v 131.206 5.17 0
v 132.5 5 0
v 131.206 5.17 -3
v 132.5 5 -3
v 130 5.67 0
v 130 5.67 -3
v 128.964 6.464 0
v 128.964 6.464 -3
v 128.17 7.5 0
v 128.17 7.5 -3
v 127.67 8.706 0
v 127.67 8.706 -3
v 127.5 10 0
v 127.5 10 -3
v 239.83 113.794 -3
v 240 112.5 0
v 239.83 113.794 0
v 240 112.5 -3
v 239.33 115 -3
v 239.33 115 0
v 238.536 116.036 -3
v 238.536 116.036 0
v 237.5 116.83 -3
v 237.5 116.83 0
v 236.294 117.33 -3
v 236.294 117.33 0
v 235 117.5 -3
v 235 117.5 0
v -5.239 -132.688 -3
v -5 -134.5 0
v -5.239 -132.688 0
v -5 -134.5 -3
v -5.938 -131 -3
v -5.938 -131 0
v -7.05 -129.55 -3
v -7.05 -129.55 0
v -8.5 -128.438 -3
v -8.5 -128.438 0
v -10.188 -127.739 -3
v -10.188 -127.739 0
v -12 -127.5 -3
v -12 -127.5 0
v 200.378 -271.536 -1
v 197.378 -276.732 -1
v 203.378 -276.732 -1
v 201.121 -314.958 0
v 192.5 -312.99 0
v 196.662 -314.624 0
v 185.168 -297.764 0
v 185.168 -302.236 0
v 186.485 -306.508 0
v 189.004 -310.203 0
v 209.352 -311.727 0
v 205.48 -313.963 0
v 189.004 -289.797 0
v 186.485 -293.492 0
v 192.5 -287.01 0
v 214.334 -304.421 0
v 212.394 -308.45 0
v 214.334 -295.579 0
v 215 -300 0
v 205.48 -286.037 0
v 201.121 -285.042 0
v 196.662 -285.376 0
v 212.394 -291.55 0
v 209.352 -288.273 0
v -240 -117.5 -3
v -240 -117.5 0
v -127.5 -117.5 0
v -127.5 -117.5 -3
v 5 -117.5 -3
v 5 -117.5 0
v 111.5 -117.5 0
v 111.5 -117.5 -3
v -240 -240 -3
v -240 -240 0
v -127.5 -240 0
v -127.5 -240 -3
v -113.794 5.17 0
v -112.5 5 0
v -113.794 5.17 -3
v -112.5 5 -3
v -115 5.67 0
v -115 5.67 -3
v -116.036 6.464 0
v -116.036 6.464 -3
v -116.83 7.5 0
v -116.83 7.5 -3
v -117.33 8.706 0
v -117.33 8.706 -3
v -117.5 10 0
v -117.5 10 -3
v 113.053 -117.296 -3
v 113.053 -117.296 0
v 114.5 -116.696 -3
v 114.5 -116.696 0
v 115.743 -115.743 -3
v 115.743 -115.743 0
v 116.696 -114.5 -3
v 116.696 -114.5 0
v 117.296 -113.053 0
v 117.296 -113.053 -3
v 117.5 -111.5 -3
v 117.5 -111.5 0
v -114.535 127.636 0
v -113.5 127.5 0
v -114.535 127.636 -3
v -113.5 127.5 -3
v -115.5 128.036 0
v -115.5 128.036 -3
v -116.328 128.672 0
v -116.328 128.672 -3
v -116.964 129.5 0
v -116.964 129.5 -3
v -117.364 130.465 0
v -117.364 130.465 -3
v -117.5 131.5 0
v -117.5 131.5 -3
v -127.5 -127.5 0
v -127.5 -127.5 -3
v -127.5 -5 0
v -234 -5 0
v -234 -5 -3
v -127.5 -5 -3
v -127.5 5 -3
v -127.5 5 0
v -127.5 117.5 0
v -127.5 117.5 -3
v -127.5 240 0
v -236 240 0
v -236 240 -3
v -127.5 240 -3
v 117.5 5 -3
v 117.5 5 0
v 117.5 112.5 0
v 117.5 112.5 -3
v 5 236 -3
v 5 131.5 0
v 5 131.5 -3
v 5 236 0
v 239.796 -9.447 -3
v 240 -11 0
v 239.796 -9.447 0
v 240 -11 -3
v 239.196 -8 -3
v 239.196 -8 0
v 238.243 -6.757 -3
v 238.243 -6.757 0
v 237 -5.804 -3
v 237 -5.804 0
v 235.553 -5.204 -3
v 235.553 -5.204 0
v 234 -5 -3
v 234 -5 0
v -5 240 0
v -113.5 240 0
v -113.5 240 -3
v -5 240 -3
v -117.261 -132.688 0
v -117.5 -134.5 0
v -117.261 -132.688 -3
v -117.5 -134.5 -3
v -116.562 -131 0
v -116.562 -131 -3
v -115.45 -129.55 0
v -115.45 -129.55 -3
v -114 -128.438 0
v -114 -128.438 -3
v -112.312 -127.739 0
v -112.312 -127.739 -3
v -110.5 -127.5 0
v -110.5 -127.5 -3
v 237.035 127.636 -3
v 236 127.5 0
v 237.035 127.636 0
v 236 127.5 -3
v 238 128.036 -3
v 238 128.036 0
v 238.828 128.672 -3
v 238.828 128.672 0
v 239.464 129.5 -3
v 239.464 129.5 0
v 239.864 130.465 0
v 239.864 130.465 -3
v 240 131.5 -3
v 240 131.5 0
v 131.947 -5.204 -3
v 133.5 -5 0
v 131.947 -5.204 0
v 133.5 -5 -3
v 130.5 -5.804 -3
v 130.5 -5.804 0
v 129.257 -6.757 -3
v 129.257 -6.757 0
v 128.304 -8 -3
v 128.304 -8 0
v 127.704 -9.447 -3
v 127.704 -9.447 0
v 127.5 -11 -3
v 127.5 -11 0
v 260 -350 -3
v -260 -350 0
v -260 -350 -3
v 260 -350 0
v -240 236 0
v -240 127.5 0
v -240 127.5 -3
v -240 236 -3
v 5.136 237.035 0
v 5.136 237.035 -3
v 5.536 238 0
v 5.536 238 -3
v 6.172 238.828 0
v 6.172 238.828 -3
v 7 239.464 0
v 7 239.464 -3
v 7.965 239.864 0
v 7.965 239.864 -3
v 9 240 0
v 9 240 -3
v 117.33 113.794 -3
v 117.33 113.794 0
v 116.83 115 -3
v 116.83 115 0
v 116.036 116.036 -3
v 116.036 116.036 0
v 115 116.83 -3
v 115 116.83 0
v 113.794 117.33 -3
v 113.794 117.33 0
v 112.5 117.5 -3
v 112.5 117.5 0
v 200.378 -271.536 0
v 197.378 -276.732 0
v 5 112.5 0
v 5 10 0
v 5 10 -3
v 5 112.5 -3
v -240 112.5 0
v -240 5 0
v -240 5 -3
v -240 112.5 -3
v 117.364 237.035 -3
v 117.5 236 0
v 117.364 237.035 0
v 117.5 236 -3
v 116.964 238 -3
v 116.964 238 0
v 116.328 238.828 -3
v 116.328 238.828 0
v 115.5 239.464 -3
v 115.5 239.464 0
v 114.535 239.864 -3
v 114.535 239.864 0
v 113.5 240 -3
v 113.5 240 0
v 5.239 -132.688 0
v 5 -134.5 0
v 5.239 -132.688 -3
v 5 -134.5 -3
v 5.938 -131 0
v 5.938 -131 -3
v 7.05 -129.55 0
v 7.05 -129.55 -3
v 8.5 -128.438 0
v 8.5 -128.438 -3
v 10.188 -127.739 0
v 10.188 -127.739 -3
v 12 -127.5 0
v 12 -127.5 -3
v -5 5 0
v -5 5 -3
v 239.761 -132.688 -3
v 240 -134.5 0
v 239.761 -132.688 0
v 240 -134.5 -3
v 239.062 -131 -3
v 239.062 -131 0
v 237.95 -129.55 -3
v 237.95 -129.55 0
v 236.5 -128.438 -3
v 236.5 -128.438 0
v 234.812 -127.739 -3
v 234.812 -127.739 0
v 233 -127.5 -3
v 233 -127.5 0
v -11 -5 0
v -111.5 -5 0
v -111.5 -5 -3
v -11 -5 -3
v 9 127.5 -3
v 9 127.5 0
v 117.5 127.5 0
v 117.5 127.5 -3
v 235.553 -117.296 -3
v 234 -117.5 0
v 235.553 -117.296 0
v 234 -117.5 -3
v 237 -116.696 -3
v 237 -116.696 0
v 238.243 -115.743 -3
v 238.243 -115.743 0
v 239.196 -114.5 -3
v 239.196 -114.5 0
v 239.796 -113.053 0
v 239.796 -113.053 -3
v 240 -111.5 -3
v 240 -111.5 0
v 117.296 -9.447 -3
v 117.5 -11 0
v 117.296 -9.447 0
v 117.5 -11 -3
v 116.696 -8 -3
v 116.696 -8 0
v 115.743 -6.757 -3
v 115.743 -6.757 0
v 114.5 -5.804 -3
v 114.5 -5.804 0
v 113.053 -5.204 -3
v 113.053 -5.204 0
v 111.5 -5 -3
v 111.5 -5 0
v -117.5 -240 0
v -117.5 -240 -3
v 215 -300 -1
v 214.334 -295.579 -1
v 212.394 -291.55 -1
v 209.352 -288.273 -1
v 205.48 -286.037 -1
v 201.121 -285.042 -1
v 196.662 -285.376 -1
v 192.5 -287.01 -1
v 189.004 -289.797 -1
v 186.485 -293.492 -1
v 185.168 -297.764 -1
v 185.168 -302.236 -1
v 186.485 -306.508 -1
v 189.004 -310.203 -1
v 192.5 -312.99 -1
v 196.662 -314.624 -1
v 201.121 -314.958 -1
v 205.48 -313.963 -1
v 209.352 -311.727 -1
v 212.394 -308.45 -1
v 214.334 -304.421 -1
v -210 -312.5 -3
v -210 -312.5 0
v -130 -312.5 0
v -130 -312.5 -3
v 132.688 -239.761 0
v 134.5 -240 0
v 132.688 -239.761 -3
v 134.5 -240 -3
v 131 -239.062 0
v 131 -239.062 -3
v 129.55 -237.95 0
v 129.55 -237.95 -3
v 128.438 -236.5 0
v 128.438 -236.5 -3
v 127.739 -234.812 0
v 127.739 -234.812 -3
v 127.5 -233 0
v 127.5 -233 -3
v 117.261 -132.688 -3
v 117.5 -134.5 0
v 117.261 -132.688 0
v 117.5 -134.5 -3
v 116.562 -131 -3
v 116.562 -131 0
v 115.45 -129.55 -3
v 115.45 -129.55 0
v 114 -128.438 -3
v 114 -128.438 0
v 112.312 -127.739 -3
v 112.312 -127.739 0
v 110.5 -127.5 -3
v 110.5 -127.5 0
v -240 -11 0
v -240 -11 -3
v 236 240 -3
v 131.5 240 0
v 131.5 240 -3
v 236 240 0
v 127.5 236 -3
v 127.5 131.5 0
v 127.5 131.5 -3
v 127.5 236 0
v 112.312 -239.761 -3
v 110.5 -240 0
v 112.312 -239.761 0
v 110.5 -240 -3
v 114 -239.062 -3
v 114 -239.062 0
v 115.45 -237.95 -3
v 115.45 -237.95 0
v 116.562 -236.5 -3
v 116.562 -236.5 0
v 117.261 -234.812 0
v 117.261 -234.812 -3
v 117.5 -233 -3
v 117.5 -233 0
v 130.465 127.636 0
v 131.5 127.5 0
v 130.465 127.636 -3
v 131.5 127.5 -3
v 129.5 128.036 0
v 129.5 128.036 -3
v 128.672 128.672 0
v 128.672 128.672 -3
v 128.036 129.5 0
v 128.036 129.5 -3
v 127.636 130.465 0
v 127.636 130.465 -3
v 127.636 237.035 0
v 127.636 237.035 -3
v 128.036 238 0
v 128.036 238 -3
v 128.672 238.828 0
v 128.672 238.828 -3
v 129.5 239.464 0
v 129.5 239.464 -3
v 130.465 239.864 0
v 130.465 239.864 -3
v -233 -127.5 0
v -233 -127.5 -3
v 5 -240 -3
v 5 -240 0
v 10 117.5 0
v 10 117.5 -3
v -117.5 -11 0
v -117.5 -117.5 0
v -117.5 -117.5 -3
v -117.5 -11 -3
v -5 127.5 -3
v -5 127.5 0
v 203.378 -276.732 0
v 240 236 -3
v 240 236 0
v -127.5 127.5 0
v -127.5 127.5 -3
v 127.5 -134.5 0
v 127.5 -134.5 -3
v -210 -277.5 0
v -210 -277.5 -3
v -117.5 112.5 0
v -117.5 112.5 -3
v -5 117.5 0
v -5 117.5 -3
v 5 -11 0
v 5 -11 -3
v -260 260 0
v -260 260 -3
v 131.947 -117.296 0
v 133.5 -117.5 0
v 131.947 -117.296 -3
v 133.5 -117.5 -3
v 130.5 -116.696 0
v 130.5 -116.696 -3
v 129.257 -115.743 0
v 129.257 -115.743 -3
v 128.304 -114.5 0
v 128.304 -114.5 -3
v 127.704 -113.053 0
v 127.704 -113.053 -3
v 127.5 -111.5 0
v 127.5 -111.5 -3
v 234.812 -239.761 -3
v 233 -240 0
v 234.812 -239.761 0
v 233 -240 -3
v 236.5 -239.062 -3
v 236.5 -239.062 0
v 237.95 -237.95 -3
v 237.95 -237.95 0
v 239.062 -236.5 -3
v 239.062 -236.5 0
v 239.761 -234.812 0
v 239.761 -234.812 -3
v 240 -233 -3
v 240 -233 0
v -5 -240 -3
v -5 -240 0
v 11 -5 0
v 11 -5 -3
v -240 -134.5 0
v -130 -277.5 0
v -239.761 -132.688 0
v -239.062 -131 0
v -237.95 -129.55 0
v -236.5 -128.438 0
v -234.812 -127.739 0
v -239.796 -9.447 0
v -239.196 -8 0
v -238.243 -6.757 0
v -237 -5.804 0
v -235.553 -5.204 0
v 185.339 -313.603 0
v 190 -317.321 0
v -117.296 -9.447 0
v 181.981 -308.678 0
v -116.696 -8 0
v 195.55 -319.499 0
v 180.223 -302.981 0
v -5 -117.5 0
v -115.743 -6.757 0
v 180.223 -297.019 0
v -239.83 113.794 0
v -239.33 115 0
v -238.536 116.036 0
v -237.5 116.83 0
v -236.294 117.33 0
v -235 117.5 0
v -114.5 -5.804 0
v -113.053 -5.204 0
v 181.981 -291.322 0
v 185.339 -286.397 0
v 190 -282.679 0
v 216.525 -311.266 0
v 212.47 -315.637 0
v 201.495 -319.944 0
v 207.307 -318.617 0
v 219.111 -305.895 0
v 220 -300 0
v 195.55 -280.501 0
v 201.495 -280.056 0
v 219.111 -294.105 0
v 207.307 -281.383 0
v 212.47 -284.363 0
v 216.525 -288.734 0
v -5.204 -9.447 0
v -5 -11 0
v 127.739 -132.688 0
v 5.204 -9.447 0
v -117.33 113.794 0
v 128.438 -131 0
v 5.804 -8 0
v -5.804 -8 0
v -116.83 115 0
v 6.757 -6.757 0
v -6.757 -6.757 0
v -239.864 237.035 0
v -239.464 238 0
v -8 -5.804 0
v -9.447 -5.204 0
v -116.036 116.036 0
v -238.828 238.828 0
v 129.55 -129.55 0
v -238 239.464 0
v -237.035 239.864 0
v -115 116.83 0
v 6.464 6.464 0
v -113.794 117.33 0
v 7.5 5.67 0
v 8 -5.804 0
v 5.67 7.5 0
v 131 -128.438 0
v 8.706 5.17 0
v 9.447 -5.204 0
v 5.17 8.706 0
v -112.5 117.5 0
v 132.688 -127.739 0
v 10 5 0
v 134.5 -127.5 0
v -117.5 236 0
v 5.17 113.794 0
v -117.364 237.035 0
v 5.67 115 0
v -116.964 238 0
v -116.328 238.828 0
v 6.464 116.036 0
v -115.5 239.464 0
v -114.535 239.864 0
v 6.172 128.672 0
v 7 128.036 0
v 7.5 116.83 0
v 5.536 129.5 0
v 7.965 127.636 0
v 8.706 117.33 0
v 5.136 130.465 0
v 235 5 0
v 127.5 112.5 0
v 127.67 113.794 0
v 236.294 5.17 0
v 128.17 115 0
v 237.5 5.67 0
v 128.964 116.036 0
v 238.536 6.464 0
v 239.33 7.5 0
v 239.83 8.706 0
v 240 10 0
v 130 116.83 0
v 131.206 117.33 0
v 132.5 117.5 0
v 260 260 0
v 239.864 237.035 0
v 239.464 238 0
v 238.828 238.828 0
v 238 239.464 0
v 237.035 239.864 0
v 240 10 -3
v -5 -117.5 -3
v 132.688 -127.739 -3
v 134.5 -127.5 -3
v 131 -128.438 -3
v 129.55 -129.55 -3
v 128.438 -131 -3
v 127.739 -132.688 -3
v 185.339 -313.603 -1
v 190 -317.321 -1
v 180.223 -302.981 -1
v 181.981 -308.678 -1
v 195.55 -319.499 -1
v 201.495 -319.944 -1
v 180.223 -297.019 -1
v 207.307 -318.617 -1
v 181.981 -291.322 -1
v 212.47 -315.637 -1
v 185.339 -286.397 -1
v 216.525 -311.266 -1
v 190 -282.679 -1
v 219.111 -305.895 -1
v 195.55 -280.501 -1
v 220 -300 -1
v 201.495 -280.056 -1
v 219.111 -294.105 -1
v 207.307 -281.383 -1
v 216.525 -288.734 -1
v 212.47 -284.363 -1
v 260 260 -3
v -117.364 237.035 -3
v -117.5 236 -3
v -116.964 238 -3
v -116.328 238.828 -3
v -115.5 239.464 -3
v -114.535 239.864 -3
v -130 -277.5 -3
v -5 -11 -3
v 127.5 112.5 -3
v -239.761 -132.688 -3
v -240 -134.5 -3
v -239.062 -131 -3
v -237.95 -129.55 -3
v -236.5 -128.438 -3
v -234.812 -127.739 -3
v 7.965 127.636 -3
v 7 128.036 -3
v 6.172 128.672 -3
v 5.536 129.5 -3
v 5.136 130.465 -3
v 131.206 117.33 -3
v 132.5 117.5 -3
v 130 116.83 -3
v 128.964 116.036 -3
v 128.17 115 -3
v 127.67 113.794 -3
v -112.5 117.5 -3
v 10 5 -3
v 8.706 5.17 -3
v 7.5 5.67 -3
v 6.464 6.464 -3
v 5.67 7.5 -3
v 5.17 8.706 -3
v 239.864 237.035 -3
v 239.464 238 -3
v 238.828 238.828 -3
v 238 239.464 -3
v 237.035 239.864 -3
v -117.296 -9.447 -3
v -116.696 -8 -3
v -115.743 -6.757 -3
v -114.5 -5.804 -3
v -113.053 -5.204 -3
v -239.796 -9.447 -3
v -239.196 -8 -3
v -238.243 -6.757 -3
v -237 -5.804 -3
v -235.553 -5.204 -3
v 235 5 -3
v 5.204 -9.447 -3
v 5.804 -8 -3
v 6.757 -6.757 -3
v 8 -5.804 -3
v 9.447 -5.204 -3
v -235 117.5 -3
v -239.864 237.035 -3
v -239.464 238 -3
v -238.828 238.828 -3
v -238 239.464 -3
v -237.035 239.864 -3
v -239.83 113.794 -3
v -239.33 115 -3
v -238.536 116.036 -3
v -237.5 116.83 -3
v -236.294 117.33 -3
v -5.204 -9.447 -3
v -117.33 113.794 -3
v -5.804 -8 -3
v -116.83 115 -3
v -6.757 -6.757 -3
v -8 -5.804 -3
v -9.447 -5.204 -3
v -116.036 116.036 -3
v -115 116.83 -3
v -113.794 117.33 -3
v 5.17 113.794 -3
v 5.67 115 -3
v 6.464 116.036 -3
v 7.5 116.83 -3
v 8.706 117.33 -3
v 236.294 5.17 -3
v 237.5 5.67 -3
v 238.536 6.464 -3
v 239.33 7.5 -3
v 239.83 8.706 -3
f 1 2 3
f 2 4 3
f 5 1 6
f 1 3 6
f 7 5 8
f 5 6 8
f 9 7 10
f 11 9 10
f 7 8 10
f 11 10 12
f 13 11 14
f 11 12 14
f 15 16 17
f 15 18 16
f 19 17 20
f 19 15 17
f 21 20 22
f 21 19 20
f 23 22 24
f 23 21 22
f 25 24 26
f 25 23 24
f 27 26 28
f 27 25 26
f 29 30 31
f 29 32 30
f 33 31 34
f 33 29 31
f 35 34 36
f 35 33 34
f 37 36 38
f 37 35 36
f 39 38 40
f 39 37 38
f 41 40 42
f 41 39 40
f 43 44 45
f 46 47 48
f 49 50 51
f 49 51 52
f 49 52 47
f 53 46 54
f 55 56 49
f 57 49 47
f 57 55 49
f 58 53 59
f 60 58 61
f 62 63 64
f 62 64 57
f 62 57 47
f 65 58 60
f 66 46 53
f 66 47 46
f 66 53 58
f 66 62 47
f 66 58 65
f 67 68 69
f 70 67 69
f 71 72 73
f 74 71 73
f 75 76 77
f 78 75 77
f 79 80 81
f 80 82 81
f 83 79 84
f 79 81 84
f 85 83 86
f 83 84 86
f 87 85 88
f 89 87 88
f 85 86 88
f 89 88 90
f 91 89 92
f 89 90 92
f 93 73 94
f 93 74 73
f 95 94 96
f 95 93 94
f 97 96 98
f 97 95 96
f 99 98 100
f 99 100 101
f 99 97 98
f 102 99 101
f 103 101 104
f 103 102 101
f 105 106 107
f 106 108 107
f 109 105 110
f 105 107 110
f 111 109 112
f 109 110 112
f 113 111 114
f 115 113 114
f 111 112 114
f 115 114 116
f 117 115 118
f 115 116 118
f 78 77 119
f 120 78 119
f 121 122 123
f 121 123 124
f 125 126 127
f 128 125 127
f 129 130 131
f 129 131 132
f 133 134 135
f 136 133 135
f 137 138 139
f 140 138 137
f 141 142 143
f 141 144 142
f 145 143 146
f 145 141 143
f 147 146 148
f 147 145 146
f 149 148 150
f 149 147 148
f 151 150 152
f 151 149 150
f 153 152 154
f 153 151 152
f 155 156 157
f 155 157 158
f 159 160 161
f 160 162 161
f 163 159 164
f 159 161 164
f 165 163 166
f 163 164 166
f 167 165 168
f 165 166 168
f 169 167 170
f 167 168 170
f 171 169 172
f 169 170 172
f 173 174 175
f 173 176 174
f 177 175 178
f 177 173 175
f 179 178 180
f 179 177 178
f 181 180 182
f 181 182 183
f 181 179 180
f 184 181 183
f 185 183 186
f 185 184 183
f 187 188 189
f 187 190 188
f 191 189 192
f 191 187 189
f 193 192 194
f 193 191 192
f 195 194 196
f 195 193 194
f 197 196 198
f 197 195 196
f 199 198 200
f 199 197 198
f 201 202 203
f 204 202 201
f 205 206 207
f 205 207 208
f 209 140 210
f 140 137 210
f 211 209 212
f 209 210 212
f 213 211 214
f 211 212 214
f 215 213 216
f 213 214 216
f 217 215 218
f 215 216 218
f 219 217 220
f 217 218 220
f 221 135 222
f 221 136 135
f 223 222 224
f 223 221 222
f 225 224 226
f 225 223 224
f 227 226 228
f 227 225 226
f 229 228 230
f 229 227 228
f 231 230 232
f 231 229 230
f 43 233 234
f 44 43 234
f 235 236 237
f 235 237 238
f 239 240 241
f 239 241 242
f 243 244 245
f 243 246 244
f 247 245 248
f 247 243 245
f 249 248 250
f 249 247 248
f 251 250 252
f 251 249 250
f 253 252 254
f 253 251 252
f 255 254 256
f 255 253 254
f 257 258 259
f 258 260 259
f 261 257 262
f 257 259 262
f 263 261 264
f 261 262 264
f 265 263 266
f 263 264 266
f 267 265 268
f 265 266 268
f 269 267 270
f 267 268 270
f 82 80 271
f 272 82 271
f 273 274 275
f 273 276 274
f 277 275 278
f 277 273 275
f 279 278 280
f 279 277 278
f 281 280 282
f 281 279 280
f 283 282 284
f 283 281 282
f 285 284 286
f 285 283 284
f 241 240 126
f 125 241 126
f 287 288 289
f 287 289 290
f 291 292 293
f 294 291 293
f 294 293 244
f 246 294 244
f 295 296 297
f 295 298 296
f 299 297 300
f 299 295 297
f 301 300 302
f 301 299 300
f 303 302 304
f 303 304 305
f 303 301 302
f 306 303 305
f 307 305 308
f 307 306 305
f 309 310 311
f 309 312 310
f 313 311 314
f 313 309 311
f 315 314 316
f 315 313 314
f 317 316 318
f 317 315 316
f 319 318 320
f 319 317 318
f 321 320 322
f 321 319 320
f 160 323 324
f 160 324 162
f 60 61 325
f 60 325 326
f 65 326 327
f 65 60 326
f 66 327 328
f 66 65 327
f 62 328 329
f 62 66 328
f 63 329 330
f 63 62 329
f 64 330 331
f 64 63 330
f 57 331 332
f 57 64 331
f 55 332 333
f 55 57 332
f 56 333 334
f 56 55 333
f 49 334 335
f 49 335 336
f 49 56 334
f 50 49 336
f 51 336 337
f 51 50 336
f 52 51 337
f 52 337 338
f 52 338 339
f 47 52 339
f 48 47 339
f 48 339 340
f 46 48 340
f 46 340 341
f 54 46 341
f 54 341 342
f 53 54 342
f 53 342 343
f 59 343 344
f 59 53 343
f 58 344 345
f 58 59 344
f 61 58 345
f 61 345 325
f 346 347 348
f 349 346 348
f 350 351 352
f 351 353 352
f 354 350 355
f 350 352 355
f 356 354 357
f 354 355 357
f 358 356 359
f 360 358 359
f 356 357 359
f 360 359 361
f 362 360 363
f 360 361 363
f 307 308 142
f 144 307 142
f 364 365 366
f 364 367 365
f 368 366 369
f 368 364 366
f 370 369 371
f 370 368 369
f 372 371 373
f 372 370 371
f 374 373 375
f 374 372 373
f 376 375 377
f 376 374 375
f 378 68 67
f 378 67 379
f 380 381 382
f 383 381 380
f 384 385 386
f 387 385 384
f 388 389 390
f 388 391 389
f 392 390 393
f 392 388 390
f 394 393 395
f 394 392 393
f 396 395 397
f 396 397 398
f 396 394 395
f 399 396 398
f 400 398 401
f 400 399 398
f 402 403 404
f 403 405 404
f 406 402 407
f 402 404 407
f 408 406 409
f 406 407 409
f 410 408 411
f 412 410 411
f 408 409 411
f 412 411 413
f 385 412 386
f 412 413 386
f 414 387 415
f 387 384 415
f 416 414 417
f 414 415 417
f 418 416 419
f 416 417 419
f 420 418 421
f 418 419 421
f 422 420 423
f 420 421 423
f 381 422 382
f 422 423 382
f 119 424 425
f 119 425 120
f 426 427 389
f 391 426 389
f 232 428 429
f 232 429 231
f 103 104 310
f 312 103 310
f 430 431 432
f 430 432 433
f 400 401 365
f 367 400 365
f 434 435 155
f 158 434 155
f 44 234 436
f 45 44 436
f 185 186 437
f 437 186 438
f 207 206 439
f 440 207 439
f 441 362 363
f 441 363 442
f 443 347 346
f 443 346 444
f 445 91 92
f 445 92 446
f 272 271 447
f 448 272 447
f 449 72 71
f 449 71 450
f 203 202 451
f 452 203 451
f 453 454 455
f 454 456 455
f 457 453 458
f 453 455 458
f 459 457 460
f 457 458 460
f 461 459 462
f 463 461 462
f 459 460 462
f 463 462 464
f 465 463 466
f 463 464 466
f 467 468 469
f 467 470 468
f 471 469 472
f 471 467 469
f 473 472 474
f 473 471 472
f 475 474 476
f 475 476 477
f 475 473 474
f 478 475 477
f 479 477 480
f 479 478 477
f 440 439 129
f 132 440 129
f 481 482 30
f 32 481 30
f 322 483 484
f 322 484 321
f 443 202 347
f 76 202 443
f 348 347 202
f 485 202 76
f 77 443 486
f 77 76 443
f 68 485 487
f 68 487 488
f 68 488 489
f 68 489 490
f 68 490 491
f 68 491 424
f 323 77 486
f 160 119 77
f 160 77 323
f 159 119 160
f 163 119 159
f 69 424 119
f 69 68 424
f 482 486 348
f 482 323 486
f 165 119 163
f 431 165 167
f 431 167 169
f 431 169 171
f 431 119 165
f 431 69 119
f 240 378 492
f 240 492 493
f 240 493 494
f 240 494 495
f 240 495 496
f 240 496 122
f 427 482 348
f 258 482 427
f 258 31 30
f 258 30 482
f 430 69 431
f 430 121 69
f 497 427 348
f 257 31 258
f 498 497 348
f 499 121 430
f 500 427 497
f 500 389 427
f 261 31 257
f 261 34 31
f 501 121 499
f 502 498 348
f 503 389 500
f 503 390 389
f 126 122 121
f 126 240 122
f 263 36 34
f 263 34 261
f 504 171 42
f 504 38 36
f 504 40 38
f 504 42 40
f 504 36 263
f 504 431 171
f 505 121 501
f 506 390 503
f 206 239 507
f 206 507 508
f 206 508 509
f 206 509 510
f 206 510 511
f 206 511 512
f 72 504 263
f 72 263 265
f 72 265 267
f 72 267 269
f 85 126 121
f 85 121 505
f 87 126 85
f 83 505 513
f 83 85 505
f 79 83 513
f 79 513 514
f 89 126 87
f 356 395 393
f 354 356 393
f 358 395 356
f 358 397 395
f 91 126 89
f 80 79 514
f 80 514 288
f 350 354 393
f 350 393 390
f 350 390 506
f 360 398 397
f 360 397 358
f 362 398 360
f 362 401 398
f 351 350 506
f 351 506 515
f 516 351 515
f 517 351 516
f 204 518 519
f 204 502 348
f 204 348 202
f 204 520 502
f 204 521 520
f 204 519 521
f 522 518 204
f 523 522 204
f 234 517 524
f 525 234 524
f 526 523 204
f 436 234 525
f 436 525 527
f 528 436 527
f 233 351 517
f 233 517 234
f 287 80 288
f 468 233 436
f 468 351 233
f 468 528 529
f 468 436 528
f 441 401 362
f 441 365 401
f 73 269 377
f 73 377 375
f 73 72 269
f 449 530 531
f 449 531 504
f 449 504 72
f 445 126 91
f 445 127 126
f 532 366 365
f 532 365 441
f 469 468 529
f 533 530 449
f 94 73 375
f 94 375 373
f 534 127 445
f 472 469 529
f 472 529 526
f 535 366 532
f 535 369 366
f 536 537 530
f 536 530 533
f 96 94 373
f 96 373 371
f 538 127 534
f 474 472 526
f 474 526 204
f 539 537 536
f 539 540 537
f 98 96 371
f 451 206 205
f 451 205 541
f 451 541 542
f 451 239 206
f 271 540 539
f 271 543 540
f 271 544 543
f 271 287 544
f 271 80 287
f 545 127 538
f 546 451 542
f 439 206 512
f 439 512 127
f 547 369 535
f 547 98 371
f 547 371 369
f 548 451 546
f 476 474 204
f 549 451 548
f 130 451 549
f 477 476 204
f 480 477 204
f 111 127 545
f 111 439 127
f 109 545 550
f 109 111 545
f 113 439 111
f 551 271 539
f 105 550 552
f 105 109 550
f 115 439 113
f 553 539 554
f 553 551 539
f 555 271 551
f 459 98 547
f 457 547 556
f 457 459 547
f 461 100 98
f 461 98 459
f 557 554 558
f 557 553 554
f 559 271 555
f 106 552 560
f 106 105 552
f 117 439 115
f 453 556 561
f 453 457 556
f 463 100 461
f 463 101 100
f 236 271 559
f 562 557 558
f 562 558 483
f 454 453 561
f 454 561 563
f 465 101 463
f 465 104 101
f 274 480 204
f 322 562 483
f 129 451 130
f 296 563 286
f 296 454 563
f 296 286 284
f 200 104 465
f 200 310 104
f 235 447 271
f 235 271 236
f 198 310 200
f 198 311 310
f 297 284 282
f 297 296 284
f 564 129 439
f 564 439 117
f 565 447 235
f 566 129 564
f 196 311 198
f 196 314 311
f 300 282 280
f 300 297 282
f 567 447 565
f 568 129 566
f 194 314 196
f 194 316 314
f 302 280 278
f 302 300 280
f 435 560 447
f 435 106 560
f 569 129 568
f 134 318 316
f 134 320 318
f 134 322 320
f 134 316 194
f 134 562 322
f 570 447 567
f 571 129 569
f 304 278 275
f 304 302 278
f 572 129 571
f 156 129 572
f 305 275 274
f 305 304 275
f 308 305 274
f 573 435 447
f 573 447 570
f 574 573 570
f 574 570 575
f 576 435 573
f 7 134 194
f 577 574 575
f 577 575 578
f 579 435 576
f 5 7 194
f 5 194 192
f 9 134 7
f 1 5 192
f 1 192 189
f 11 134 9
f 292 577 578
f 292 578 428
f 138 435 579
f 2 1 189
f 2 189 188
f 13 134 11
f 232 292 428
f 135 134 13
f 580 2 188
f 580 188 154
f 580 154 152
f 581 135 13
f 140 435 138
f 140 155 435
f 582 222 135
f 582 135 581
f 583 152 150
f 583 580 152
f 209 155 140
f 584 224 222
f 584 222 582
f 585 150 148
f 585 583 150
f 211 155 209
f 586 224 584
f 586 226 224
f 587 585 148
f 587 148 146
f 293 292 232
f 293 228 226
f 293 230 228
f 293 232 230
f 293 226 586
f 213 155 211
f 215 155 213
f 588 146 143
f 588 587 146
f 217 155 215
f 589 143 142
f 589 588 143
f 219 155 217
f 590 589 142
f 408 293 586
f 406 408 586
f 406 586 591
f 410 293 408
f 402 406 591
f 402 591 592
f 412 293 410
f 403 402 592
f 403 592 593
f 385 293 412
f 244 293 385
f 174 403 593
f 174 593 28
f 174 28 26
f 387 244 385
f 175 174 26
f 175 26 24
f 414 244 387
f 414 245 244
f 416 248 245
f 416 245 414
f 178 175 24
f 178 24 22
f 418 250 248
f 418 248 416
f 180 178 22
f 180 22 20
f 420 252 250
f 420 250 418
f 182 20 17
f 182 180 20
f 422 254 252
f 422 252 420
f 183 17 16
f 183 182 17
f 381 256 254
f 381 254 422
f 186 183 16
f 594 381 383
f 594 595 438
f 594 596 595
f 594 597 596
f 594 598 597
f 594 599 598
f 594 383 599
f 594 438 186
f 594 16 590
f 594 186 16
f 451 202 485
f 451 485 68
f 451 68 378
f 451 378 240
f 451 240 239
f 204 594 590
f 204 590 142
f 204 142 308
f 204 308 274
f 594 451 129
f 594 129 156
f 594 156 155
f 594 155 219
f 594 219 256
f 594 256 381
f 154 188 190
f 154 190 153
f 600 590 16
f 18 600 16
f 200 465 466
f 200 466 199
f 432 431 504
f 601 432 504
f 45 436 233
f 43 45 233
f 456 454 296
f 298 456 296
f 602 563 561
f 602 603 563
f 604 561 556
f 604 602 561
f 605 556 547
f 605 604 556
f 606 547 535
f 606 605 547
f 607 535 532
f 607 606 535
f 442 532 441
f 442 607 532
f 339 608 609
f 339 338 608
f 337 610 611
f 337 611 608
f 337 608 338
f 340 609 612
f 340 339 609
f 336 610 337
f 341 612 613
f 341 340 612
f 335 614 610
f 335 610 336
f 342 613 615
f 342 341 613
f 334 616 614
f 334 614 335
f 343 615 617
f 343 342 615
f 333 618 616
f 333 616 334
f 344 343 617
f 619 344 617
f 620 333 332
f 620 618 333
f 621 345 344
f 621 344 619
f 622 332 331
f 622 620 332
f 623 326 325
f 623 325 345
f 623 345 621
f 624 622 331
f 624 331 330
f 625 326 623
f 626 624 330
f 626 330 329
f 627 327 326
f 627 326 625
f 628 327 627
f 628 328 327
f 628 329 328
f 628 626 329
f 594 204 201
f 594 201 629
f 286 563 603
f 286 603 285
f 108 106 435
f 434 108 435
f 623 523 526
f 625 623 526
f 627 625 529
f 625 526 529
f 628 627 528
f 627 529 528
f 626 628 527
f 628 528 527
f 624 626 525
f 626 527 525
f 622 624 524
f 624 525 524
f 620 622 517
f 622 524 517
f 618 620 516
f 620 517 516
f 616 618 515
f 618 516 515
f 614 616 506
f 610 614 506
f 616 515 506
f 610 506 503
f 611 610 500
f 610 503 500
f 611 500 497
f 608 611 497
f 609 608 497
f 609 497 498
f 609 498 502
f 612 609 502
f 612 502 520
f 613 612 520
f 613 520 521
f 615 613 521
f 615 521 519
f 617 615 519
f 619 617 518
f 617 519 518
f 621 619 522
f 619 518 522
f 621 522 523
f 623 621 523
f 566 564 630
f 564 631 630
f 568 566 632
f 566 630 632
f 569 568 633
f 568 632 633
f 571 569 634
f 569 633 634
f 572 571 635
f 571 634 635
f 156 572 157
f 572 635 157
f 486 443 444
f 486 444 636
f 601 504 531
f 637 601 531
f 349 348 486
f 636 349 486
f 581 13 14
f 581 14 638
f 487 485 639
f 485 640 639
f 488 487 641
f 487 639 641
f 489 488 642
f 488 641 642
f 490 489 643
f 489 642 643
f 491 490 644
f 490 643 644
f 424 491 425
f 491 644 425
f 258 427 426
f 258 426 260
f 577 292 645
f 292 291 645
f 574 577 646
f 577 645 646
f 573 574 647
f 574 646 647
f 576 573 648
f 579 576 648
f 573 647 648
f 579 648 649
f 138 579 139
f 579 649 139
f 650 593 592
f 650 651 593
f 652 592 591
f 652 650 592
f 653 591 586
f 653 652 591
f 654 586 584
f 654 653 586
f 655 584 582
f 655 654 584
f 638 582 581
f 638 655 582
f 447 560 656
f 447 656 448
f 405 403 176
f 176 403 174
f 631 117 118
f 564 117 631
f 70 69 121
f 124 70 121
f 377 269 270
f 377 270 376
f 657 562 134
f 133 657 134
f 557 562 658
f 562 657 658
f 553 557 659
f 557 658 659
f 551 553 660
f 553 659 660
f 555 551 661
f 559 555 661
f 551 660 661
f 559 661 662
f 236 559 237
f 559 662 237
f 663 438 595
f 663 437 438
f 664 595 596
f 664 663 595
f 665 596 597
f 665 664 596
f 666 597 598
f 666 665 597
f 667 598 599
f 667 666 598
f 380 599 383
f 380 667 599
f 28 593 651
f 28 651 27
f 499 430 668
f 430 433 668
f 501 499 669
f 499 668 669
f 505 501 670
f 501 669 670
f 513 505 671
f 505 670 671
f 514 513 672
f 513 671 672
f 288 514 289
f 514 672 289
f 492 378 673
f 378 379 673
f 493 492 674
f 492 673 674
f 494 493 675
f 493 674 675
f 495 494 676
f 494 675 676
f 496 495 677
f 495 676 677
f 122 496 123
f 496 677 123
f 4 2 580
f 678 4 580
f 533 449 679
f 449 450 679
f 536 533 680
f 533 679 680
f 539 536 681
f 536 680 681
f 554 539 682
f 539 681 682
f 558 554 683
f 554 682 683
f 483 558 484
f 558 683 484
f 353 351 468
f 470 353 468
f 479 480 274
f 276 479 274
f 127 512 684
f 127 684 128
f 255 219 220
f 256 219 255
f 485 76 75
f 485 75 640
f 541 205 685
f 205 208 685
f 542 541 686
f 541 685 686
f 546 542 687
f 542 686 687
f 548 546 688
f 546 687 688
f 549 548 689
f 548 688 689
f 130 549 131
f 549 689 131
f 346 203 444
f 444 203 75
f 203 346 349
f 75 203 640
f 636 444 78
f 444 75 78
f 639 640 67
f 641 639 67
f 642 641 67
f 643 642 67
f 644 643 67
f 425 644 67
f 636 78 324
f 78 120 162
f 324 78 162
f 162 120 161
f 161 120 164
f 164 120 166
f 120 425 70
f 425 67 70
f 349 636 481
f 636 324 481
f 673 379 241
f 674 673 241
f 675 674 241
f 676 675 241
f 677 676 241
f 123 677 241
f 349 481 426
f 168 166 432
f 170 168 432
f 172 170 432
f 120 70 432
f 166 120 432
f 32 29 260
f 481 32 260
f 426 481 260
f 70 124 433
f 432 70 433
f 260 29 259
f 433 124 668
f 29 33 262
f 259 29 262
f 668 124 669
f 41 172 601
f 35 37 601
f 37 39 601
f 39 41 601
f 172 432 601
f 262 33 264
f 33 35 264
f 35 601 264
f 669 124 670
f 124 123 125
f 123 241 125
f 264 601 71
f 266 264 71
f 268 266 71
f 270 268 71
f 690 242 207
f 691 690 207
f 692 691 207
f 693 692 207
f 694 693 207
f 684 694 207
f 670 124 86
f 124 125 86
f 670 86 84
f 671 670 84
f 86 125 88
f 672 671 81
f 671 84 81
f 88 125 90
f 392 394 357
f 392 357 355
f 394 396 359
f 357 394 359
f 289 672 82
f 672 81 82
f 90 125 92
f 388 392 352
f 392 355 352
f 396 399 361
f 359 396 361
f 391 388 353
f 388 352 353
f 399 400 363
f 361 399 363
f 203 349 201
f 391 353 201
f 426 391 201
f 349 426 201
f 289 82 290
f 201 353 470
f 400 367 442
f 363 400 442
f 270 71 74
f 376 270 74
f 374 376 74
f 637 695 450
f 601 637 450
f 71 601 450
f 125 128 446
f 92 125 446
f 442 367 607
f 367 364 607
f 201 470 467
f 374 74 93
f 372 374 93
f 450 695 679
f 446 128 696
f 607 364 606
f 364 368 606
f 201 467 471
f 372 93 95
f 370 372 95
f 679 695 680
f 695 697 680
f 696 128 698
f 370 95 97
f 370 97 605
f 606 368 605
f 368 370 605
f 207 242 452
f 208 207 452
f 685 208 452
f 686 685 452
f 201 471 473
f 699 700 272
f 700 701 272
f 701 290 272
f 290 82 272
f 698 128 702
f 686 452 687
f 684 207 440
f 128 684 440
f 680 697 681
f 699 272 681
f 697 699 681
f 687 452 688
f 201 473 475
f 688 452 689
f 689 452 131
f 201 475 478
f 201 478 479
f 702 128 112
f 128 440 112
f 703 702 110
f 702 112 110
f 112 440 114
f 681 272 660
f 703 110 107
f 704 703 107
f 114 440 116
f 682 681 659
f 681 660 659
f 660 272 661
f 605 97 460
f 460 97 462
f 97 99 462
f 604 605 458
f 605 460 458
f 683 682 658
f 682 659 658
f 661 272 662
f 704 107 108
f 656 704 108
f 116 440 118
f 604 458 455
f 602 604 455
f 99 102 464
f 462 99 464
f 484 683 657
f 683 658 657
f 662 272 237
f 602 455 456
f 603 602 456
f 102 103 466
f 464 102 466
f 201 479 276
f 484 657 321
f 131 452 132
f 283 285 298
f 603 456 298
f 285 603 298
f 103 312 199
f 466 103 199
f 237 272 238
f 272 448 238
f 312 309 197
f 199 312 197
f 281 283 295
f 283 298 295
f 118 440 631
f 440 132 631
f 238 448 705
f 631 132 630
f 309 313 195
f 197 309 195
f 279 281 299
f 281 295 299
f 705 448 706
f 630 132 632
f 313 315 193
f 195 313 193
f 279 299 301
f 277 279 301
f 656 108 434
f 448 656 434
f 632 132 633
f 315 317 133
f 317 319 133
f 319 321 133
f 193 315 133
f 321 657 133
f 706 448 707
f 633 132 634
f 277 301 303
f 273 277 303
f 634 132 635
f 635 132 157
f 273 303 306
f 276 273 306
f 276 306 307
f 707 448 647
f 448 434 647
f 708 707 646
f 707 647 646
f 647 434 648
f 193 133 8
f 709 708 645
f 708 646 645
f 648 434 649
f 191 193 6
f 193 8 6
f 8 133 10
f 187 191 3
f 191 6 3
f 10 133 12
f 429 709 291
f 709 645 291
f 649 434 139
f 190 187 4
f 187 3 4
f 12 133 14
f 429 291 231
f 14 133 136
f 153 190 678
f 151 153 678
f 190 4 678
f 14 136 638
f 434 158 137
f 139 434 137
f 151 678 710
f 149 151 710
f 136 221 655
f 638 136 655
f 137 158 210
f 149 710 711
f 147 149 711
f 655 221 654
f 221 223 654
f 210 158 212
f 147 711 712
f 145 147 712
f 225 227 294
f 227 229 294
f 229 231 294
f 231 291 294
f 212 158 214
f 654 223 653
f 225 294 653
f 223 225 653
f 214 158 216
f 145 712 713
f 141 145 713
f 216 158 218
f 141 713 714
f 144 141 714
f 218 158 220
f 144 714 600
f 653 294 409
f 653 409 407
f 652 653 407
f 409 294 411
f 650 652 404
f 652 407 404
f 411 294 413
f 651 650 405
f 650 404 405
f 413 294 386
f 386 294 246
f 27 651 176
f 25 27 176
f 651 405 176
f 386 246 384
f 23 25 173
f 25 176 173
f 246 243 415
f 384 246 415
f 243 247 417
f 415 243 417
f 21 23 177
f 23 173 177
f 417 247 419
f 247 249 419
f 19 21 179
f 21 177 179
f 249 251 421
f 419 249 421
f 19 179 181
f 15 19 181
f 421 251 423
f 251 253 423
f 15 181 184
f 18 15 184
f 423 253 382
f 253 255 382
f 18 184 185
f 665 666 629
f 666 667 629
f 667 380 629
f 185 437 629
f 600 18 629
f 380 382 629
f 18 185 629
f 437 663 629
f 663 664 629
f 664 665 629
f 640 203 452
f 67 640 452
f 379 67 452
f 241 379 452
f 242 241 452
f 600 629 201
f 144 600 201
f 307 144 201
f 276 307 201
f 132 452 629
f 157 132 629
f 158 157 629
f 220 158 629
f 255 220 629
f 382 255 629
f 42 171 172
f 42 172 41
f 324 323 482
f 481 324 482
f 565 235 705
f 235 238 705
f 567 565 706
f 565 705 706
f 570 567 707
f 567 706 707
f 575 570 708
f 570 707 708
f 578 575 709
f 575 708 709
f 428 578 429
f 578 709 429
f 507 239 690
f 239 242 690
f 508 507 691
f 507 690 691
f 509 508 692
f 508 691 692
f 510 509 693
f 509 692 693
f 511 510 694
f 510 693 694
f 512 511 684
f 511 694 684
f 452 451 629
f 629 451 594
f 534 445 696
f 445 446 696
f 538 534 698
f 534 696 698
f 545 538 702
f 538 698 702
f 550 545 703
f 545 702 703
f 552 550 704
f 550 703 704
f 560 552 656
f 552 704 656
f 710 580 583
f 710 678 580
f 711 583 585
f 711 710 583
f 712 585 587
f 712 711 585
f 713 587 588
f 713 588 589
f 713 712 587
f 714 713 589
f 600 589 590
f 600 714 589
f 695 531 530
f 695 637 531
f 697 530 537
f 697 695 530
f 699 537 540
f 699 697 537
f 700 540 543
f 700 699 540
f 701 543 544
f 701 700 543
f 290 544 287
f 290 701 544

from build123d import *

# Parameters (mm, degrees)
SKETCH_W                     = 520
SKETCH_H                     = 610
PAD_DEPTH                    = 3
SKETCH001_W                  = 112.5
SKETCH001_H                  = 112.5
POCKET_DEPTH                 = 5
SKETCH001_LINEARPATTERN_2_W  = 112.5
SKETCH001_LINEARPATTERN_2_H  = 112.5
POCKET_LINEARPATTERN_2_DEPTH = 5
SKETCH001_LINEARPATTERN_3_W  = 112.5
SKETCH001_LINEARPATTERN_3_H  = 112.5
POCKET_LINEARPATTERN_3_DEPTH = 5
SKETCH001_LINEARPATTERN_4_W  = 112.5
SKETCH001_LINEARPATTERN_4_H  = 112.5
POCKET_LINEARPATTERN_4_DEPTH = 5
LINEARPATTERN001_COUNT       = 4
LINEARPATTERN001_PITCH       = 122.5
FILLET_R                     = 4
FILLET001_R                  = 5
FILLET002_R                  = 6
FILLET003_R                  = 7
SKETCH002_R                  = 20
SKETCH002_R_2                = 15
POCKET001_DEPTH              = 1
SKETCH003_W                  = 80
SKETCH003_H                  = 35
POCKET002_DEPTH              = 5


with BuildPart() as part:
    # Sketch → Pad (new body)
    with BuildSketch(Plane.XY):
        with Locations((0, -45)):
            Rectangle(SKETCH_W, SKETCH_H)
    extrude(amount=-PAD_DEPTH)

    # Sketch001 (on Face5 of Pad) → Pocket (cut)
    with BuildSketch(Plane.XY):
        with Locations((-183.75, 183.75)):
            Rectangle(SKETCH001_W, SKETCH001_H)
    pocket = extrude(amount=-POCKET_DEPTH, mode=Mode.SUBTRACT)

    # Sketch001 LinearPattern 2 → Pocket LinearPattern 2 (cut)
    with BuildSketch(Plane(origin=(122.5, 0, 0), x_dir=(1, 0, 0), z_dir=(0, 0, 1))):
        with Locations((-183.75, 183.75)):
            Rectangle(SKETCH001_LINEARPATTERN_2_W, SKETCH001_LINEARPATTERN_2_H)
    pocket_linearpattern_2 = extrude(amount=-POCKET_LINEARPATTERN_2_DEPTH, mode=Mode.SUBTRACT)

    # Sketch001 LinearPattern 3 → Pocket LinearPattern 3 (cut)
    with BuildSketch(Plane(origin=(245, 0, 0), x_dir=(1, 0, 0), z_dir=(0, 0, 1))):
        with Locations((-183.75, 183.75)):
            Rectangle(SKETCH001_LINEARPATTERN_3_W, SKETCH001_LINEARPATTERN_3_H)
    pocket_linearpattern_3 = extrude(amount=-POCKET_LINEARPATTERN_3_DEPTH, mode=Mode.SUBTRACT)

    # Sketch001 LinearPattern 4 → Pocket LinearPattern 4 (cut)
    with BuildSketch(Plane(origin=(367.5, 0, 0), x_dir=(1, 0, 0), z_dir=(0, 0, 1))):
        with Locations((-183.75, 183.75)):
            Rectangle(SKETCH001_LINEARPATTERN_4_W, SKETCH001_LINEARPATTERN_4_H)
    pocket_linearpattern_4 = extrude(amount=-POCKET_LINEARPATTERN_4_DEPTH, mode=Mode.SUBTRACT)

    # LinearPattern001: Pocket, Pocket LinearPattern 2, Pocket LinearPattern 3, Pocket LinearPattern 4 ×4
    with Locations(*[(0, -i * LINEARPATTERN001_PITCH, 0) for i in range(1, LINEARPATTERN001_COUNT)]):
        add(pocket, mode=Mode.SUBTRACT)
        add(pocket_linearpattern_2, mode=Mode.SUBTRACT)
        add(pocket_linearpattern_3, mode=Mode.SUBTRACT)
        add(pocket_linearpattern_4, mode=Mode.SUBTRACT)

    # Fillet
    fillet_edges = [part.edges().sort_by_distance(p)[0] for p in [
        (-240, 240, -1.5),
        (-117.5, 240, -1.5),
        (-117.5, 127.5, -1.5),
        (5, 240, -1.5),
        (117.5, 240, -1.5),
        (5, 127.5, -1.5),
        (127.5, 127.5, -1.5),
        (127.5, 240, -1.5),
        (240, 240, -1.5),
        (240, 127.5, -1.5),
    ]]
    fillet(fillet_edges, radius=FILLET_R)

    # Fillet001
    fillet001_edges = [part.edges().sort_by_distance(p)[0] for p in [
        (-240, 117.5, -1.5),
        (-117.5, 117.5, -1.5),
        (5, 117.5, -1.5),
        (127.5, 117.5, -1.5),
        (240, 117.5, -1.5),
        (240, 5, -1.5),
        (127.5, 5, -1.5),
        (117.5, 117.5, -1.5),
        (5, 5, -1.5),
        (-117.5, 5, -1.5),
    ]]
    fillet(fillet001_edges, radius=FILLET001_R)

    # Fillet002
    fillet002_edges = [part.edges().sort_by_distance(p)[0] for p in [
        (-240, -5, -1.5),
        (-117.5, -5, -1.5),
        (5, -5, -1.5),
        (127.5, -5, -1.5),
        (240, -5, -1.5),
        (240, -117.5, -1.5),
        (127.5, -117.5, -1.5),
        (117.5, -5, -1.5),
        (117.5, -117.5, -1.5),
        (-5, -5, -1.5),
    ]]
    fillet(fillet002_edges, radius=FILLET002_R)

    # Fillet003
    fillet003_edges = [part.edges().sort_by_distance(p)[0] for p in [
        (-240, -127.5, -1.5),
        (-117.5, -127.5, -1.5),
        (5, -127.5, -1.5),
        (127.5, -127.5, -1.5),
        (240, -127.5, -1.5),
        (240, -240, -1.5),
        (127.5, -240, -1.5),
        (117.5, -127.5, -1.5),
        (117.5, -240, -1.5),
        (-5, -127.5, -1.5),
    ]]
    fillet(fillet003_edges, radius=FILLET003_R)

    # Sketch002 (on Face1 of Fillet003) → Pocket001 (cut)
    with BuildSketch(Plane.XY):
        with Locations((200, -300)):
            Circle(SKETCH002_R)
        with Locations((200, -300)):
            Circle(SKETCH002_R_2, mode=Mode.SUBTRACT)
        Polygon((200.37776, -271.535898), (197.37776, -276.732051), (203.37776, -276.732051), align=None)
    extrude(amount=-POCKET001_DEPTH, mode=Mode.SUBTRACT)

    # Sketch003 (on Face1 of Pocket001) → Pocket002 (cut)
    with BuildSketch(Plane.XY):
        with Locations((-170, -295)):
            Rectangle(SKETCH003_W, SKETCH003_H)
    extrude(amount=-POCKET002_DEPTH, mode=Mode.SUBTRACT)


solid = part.part
